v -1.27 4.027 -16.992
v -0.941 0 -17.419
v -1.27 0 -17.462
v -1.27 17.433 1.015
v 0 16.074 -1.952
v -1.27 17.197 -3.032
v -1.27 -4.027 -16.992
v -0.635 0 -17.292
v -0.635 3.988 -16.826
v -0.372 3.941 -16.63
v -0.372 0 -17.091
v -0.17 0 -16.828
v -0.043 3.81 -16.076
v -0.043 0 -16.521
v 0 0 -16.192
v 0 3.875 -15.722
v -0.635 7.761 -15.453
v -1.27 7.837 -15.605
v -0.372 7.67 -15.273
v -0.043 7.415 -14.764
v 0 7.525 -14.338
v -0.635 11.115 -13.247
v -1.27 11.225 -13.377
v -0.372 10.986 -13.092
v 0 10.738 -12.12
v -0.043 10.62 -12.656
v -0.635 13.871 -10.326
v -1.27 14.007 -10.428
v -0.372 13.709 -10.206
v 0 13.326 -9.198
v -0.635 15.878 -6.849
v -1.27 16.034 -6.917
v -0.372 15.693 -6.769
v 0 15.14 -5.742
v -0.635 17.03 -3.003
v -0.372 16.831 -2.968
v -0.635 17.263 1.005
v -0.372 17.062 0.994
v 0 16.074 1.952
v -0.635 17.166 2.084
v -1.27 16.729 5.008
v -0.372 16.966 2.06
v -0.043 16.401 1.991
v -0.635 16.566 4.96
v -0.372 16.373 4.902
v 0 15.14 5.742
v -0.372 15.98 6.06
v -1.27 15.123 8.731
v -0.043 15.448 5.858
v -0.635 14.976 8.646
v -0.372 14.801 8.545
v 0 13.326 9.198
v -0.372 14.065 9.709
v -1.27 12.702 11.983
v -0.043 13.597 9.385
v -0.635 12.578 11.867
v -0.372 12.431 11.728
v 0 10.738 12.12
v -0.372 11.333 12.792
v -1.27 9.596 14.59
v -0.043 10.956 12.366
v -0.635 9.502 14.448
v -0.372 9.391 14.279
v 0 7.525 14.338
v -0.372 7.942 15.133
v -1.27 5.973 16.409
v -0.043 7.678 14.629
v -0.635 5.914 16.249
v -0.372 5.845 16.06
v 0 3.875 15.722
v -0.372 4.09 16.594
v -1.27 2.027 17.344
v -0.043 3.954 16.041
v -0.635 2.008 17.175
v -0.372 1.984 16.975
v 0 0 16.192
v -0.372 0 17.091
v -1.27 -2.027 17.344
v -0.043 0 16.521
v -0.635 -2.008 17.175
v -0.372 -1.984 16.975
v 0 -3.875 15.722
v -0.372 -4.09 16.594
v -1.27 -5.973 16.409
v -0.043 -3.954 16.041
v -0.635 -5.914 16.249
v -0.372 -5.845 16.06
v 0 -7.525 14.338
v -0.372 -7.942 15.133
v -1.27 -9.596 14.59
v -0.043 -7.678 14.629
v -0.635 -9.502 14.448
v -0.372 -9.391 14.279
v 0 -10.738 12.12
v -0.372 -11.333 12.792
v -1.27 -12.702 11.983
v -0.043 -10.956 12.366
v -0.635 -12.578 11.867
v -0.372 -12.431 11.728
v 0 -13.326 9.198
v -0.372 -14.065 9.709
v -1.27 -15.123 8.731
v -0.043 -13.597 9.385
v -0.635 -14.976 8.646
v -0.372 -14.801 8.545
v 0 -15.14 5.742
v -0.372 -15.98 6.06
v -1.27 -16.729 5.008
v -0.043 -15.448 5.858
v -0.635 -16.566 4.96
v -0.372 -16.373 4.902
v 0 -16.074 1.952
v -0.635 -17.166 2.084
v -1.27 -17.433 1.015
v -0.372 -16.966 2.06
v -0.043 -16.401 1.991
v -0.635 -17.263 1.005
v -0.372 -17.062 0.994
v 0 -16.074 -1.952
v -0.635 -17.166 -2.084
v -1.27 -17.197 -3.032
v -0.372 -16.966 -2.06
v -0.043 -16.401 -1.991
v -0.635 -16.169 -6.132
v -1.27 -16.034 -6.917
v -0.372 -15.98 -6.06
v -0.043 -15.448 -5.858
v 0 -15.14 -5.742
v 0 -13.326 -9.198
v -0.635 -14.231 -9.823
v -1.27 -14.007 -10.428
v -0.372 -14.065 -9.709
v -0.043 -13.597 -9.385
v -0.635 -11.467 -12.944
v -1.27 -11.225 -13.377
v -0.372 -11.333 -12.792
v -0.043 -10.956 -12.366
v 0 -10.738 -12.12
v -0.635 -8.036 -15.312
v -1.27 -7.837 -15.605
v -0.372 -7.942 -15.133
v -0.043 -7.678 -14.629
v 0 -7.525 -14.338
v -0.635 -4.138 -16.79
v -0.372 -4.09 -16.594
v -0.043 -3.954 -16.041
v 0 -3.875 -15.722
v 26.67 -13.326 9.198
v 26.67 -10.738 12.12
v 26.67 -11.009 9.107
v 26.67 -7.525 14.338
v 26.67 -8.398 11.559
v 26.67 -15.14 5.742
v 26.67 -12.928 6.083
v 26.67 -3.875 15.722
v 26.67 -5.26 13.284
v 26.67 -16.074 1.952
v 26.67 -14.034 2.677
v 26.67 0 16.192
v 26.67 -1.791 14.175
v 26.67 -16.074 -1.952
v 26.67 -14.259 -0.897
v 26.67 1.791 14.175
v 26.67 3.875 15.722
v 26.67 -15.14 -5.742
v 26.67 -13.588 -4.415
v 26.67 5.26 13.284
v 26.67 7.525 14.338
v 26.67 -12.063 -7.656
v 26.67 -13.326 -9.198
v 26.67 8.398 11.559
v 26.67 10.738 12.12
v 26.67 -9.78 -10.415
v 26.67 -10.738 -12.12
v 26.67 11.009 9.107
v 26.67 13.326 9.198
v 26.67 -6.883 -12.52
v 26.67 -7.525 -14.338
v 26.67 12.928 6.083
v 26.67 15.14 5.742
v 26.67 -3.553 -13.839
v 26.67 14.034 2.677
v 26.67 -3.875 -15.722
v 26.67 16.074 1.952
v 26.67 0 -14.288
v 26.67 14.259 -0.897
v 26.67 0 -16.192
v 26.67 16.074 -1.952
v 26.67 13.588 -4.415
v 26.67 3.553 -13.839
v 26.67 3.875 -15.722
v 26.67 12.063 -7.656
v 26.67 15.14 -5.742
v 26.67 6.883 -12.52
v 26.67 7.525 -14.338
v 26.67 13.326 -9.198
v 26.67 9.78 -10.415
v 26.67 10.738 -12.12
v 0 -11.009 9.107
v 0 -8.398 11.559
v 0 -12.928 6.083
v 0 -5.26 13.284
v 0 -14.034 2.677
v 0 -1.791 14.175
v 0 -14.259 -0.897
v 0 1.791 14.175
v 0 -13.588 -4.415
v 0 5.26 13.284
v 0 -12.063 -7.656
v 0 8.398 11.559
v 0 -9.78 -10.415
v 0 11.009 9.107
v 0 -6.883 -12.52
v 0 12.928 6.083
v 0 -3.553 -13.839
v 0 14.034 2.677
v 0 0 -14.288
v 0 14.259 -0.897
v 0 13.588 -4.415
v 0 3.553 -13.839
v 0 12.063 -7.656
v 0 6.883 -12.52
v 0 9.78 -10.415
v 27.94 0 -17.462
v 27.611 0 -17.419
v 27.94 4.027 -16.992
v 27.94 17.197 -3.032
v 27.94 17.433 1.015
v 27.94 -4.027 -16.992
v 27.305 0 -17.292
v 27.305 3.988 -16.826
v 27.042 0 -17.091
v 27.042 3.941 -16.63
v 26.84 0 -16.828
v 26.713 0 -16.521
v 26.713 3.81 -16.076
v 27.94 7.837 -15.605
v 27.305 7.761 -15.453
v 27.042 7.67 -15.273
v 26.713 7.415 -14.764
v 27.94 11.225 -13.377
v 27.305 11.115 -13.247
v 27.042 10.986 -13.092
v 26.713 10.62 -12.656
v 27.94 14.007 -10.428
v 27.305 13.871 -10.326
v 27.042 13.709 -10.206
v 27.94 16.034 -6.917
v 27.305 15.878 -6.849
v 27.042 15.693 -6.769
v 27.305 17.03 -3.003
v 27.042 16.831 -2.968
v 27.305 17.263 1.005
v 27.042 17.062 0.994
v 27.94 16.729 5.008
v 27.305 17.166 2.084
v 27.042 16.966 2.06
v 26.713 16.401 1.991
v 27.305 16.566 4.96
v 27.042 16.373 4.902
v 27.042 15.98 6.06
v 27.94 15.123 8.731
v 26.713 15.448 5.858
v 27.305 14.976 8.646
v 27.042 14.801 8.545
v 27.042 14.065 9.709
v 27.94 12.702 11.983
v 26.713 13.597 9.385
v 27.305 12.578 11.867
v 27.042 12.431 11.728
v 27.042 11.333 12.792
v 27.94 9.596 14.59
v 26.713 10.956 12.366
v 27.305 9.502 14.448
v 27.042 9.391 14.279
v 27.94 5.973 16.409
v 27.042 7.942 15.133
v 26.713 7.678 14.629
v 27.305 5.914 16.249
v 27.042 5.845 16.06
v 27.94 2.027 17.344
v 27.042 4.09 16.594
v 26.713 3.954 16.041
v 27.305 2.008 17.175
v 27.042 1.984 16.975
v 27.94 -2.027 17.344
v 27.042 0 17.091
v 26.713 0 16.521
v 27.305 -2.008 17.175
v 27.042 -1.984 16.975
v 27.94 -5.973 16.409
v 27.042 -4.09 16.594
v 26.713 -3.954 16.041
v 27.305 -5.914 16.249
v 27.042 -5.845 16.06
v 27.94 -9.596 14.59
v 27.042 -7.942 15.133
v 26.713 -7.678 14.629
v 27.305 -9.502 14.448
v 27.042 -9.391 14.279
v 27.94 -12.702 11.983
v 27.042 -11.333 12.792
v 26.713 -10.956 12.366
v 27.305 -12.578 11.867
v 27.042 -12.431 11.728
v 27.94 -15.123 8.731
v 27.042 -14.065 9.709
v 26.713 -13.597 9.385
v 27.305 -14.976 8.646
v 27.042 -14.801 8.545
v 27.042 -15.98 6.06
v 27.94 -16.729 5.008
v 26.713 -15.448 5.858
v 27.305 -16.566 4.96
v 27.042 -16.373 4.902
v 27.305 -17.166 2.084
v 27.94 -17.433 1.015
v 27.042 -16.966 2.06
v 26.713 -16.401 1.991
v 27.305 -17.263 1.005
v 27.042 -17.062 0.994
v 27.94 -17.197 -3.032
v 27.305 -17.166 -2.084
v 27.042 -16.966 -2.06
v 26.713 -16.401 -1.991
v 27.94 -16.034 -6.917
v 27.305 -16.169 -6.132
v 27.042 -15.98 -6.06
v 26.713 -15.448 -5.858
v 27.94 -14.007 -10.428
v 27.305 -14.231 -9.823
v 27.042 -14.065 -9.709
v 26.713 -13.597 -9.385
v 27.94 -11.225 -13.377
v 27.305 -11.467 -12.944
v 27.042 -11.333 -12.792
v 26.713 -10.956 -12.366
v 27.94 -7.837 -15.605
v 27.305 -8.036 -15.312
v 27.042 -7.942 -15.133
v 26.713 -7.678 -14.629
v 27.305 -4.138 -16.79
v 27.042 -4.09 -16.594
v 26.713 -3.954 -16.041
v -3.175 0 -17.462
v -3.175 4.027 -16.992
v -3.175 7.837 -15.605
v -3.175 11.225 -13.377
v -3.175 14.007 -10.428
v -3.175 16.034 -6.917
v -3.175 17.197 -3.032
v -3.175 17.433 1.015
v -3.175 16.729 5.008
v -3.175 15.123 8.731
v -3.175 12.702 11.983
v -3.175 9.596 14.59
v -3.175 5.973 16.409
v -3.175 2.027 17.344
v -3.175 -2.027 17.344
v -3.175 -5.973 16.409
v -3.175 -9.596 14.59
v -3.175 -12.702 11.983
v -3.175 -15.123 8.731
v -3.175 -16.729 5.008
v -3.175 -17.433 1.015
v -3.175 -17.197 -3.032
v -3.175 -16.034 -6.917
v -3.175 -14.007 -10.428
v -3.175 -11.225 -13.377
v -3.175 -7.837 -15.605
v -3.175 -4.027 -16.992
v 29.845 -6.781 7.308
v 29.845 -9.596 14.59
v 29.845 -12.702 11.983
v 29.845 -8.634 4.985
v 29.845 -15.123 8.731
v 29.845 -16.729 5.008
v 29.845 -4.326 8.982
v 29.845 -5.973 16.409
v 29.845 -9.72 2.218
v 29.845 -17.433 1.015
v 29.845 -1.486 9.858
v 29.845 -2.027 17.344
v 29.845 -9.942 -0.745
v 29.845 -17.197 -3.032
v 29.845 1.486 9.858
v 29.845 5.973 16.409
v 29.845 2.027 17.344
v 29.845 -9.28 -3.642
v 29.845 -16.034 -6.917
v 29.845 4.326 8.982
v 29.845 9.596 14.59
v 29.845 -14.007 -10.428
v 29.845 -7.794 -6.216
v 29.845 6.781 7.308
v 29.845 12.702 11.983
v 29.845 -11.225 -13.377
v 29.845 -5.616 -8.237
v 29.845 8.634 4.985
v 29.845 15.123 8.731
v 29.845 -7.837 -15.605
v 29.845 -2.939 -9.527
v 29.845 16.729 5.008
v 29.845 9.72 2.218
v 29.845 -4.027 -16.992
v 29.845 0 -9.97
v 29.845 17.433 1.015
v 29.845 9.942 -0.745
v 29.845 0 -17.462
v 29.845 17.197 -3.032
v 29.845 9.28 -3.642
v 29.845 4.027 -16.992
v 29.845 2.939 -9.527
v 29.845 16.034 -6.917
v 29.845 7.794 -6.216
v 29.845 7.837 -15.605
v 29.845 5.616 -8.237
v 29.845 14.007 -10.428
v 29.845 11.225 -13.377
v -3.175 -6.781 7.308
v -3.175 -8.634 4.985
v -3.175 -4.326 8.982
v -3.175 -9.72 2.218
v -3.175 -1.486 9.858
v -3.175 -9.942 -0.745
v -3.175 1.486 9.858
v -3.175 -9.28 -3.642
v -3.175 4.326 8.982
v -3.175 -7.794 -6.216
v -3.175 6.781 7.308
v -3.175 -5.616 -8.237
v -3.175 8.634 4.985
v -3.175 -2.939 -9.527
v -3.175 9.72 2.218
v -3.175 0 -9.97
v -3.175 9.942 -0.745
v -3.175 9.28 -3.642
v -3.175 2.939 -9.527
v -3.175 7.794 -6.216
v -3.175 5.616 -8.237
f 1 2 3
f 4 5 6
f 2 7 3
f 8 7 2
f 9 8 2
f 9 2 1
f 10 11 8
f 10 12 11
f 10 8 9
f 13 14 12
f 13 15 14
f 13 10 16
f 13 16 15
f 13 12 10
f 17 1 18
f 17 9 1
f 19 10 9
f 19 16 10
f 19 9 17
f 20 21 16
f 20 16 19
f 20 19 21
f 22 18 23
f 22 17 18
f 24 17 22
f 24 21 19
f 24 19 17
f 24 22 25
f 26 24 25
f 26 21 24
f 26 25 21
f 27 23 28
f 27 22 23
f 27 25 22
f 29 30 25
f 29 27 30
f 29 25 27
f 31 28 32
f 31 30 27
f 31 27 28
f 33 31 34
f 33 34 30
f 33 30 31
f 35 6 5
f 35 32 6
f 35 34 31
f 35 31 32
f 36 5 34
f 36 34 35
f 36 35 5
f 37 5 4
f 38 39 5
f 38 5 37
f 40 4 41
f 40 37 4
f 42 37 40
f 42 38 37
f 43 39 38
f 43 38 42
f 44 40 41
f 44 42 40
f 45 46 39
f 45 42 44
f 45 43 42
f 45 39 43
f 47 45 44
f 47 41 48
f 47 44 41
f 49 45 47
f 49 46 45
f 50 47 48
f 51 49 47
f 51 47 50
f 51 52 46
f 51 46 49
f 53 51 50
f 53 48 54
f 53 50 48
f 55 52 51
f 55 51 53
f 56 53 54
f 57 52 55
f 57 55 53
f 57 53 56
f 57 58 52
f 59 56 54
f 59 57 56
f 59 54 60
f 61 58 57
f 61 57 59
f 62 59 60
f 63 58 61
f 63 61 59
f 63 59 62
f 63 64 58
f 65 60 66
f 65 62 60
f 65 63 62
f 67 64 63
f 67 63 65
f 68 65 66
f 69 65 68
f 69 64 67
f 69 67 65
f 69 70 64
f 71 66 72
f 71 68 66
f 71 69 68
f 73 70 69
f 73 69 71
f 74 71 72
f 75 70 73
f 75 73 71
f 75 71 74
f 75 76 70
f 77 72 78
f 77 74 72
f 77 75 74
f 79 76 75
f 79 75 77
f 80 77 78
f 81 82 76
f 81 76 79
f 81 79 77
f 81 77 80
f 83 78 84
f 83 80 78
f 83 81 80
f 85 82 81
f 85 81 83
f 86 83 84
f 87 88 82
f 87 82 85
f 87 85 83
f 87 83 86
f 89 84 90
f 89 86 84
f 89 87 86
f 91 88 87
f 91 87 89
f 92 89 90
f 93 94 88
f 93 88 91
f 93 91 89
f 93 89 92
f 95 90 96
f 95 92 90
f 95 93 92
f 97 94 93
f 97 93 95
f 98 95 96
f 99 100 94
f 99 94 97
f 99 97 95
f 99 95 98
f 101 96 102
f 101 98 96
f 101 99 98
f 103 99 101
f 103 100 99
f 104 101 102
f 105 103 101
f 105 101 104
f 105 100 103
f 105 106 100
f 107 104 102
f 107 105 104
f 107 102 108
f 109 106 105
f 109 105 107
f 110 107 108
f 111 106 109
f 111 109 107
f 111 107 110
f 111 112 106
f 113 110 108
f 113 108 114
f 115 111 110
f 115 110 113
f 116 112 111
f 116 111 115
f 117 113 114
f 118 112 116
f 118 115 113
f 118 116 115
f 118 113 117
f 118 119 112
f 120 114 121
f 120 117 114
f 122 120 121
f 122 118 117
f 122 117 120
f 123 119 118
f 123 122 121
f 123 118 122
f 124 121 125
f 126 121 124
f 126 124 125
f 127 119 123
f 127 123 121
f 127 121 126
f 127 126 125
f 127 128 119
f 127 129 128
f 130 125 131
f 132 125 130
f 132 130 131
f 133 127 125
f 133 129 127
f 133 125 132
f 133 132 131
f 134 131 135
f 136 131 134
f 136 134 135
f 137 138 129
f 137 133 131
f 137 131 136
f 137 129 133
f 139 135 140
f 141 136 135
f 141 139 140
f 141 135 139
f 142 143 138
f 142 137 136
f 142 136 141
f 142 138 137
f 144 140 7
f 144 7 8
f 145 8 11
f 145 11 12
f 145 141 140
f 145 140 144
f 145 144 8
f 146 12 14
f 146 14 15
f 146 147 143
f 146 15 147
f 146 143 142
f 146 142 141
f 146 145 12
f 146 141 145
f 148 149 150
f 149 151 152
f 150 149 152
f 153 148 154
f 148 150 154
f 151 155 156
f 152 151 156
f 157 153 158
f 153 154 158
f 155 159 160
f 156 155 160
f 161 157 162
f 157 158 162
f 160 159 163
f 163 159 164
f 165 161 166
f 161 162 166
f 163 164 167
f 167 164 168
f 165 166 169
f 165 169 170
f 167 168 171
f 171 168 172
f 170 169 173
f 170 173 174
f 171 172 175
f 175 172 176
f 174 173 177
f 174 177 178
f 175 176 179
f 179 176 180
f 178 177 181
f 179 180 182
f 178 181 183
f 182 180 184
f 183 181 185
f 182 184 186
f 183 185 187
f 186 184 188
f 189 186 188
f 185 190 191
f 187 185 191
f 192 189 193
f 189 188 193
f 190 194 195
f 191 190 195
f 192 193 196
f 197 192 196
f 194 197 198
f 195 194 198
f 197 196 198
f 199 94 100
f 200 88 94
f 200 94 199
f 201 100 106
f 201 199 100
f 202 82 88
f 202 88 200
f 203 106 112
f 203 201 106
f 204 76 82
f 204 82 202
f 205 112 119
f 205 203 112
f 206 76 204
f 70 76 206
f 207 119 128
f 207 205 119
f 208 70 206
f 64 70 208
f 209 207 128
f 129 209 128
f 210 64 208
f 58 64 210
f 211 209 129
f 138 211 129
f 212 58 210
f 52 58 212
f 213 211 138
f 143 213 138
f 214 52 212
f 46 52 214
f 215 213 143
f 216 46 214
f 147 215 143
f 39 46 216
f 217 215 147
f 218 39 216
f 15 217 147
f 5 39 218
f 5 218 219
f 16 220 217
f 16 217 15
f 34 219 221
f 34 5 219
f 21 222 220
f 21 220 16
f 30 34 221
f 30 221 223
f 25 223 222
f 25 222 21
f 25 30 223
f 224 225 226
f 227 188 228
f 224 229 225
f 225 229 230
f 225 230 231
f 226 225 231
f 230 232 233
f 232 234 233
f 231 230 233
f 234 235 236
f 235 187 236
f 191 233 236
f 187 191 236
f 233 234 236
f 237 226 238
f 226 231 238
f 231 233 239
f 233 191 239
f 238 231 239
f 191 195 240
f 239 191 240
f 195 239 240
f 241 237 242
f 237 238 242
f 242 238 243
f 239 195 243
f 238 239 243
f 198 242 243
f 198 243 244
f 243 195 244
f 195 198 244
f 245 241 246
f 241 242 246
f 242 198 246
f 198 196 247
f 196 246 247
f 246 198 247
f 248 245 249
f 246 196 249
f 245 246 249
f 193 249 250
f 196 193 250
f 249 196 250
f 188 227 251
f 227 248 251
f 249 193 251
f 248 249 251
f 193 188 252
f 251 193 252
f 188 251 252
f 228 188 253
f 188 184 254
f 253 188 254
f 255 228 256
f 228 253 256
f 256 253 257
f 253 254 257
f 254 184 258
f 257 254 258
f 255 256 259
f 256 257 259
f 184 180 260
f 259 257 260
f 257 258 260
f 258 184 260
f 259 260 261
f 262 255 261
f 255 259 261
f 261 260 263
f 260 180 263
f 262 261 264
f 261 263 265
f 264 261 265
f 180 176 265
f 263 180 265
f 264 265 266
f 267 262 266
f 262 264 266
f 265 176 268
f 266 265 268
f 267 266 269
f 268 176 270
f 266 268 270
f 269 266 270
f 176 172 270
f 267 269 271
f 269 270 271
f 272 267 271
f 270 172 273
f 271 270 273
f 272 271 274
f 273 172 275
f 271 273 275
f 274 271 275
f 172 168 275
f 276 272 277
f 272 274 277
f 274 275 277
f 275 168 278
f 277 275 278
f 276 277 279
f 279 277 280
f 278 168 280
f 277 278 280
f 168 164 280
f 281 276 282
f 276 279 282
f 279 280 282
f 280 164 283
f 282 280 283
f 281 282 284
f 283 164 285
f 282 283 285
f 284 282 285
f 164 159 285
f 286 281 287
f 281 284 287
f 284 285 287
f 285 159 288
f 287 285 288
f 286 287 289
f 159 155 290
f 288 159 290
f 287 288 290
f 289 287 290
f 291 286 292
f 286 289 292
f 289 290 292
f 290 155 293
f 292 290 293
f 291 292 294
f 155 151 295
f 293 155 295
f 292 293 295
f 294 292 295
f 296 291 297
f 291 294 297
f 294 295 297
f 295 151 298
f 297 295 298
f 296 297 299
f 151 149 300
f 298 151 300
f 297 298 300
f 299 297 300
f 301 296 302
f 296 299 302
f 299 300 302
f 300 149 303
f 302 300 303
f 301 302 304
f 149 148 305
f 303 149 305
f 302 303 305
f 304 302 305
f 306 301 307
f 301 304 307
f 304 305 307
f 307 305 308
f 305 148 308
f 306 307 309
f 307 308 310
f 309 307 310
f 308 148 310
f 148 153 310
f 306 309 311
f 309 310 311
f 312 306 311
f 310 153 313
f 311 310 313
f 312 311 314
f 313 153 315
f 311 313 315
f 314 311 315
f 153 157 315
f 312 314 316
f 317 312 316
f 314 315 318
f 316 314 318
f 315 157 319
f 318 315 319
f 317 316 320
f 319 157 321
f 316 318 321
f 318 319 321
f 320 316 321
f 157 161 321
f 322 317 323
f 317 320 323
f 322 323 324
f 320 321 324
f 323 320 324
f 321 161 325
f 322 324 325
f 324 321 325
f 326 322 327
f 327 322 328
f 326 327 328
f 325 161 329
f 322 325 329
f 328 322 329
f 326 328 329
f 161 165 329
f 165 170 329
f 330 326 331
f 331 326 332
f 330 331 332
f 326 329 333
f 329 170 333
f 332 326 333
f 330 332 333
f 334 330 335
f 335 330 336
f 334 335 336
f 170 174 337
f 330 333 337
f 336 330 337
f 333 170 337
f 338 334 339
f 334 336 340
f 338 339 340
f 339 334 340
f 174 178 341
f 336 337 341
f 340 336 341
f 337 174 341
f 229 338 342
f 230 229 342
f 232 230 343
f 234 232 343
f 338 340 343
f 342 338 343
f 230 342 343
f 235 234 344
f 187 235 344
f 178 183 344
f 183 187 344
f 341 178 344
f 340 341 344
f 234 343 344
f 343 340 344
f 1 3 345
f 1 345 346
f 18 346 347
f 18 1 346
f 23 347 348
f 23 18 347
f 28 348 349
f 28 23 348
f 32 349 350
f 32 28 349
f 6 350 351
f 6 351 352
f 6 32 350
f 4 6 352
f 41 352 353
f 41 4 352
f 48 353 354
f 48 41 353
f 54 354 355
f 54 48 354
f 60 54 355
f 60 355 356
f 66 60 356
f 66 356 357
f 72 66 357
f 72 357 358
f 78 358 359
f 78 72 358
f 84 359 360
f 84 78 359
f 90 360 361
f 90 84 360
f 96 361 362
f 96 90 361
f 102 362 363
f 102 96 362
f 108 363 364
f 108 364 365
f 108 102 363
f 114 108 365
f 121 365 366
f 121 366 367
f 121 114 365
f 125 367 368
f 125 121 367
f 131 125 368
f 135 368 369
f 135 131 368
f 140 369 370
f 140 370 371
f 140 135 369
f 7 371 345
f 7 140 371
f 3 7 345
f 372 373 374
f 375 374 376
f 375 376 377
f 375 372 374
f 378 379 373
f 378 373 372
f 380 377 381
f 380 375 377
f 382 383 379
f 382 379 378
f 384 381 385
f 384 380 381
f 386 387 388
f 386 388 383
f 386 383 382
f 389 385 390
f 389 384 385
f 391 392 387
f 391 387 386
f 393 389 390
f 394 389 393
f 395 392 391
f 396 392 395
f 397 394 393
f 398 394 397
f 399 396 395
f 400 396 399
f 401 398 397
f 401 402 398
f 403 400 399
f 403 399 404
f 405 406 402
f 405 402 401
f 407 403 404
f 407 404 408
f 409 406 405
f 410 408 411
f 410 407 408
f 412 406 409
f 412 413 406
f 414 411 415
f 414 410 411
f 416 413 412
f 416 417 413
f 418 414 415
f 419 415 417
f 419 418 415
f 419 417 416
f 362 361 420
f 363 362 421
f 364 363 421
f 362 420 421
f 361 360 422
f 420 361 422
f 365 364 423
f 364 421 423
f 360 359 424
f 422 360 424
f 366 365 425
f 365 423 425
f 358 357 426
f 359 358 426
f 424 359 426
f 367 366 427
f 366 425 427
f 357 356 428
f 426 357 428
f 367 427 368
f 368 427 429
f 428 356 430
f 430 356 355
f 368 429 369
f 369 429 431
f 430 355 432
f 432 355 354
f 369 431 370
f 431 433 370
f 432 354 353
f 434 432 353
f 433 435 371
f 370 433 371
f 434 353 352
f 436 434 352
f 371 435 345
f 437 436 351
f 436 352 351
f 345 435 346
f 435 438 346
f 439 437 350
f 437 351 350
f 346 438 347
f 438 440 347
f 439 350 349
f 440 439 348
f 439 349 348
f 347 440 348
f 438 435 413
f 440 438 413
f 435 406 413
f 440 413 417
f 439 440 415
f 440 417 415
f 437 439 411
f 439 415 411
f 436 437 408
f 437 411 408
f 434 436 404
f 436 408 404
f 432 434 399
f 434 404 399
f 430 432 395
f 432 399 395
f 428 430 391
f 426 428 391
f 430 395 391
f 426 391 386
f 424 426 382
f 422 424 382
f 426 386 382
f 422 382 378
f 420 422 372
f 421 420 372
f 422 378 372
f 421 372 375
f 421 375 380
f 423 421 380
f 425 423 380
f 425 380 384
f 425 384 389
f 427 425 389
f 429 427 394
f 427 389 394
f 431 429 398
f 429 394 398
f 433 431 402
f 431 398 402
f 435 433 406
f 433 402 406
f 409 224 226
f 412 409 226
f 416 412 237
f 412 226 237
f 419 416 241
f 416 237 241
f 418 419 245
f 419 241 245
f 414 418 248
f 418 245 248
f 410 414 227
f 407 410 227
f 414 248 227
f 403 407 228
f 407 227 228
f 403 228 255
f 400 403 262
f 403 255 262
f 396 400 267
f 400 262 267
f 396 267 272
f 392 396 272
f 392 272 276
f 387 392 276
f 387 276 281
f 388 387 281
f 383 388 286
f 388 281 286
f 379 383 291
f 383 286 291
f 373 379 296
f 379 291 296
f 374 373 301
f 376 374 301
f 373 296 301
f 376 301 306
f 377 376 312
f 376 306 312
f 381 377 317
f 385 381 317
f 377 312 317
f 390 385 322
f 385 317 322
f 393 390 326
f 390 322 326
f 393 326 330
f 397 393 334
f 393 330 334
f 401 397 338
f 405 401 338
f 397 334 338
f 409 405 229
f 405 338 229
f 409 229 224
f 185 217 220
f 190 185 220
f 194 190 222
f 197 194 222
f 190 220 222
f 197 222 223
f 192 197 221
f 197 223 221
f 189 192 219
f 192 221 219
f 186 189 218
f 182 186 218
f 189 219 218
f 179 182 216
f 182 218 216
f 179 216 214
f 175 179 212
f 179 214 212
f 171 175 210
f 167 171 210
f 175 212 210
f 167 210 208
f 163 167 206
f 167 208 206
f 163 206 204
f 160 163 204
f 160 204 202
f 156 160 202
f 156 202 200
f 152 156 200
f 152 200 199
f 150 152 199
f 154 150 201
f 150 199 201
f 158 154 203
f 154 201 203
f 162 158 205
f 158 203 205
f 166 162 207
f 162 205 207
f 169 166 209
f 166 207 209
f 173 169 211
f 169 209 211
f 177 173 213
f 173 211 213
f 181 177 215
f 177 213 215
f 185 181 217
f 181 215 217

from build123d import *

# Parameters (mm, degrees)
SKETCH1_R            = 14.2875
SKETCH1_R_2          = 9.9695
BOSS_EXTRUDE1_DEPTH  = 26.67
SKETCH2_R            = 17.4625
SKETCH2_R_2          = 9.9695
BOSS_EXTRUDE2_DEPTH  = 3.175
FILLET1_R            = 1.27
FILLET1_OF_MIRROR1_R = 1.27


with BuildPart() as part:
    # Sketch1 → Boss-Extrude1 (new body)
    with BuildSketch(Plane(origin=(0, 0, 0), x_dir=(0, 0, -1), z_dir=(1, 0, 0))):
        Circle(SKETCH1_R)
        Circle(SKETCH1_R_2, mode=Mode.SUBTRACT)
    extrude(amount=BOSS_EXTRUDE1_DEPTH)

    # Sketch2 → Boss-Extrude2 (add)
    with BuildSketch(Plane(origin=(26.67, 0, 0), x_dir=(0, 0, -1), z_dir=(1, 0, 0))):
        Circle(SKETCH2_R)
        Circle(SKETCH2_R_2, mode=Mode.SUBTRACT)
    boss_extrude2 = extrude(amount=BOSS_EXTRUDE2_DEPTH)

    # Fillet1
    fillet1_edges = [part.edges().sort_by_distance(p)[0] for p in [
        (26.67, 0, 17.4625),
    ]]
    fillet(fillet1_edges, radius=FILLET1_R)

    # Mirror1: Boss-Extrude2 across plane
    add(boss_extrude2.mirror(Plane.ZY.offset(-13.335)))

    # Fillet1 of Mirror1
    fillet1_of_mirror1_edges = [part.edges().sort_by_distance(p)[0] for p in [
        (0, 0, 17.4625),
    ]]
    fillet(fillet1_of_mirror1_edges, radius=FILLET1_OF_MIRROR1_R)


solid = part.part
